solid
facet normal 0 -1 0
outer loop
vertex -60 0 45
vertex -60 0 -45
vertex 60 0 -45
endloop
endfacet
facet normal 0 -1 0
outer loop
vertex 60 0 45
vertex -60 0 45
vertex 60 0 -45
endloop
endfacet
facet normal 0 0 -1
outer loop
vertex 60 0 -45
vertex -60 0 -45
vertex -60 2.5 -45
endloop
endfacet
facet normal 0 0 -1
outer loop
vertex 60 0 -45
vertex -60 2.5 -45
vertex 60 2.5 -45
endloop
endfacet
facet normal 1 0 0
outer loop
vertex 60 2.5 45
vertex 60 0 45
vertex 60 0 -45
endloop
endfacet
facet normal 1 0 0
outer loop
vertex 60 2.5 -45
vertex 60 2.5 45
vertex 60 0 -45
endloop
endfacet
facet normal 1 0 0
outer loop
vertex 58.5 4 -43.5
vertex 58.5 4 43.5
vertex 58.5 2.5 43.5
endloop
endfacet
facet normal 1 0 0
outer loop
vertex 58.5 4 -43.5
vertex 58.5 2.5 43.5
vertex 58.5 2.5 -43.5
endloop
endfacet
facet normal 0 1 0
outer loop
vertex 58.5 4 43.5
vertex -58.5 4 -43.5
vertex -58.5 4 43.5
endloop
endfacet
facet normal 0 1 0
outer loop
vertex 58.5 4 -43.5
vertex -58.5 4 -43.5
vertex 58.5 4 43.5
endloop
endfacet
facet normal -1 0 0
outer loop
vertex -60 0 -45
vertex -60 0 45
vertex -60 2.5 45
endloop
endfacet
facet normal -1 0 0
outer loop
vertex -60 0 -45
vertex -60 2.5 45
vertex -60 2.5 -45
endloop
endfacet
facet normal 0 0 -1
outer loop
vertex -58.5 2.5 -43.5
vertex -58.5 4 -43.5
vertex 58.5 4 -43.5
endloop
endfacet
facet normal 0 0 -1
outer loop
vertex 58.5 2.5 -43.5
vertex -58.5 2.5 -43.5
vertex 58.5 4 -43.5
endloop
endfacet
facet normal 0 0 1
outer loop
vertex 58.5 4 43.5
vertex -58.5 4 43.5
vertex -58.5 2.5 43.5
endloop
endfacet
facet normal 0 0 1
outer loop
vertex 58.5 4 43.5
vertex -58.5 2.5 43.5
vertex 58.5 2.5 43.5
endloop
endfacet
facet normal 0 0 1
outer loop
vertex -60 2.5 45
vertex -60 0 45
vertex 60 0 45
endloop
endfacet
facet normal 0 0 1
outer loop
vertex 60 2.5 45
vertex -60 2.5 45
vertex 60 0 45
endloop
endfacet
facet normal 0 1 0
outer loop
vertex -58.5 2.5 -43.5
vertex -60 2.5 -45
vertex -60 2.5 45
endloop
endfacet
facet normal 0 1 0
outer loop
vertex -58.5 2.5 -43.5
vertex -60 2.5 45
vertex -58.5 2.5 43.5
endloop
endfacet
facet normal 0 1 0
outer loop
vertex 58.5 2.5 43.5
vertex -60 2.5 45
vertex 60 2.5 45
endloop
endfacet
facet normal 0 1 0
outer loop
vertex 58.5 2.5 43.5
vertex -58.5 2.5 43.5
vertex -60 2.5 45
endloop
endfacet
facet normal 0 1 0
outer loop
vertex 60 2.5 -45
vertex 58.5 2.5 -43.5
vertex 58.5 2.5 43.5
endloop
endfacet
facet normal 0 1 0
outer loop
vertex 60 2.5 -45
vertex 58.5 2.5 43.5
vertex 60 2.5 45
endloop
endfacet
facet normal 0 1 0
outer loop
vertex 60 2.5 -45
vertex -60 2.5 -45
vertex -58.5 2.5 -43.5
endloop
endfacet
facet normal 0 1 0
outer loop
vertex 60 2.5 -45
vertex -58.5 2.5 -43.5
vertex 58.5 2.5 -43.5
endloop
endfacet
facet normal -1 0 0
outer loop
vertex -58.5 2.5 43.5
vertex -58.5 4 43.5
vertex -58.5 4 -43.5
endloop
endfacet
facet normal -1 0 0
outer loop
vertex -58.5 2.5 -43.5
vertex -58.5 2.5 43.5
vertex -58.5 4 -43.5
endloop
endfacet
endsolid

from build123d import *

# Parameters (mm, degrees)
SKETCH1_W           = 120
SKETCH1_H           = 90
BOSS_EXTRUDE1_DEPTH = 4
SKETCH2_OUTSIDE_W   = 152.01
SKETCH2_OUTSIDE_H   = 122.01
SKETCH2_OUTSIDE_W_2 = 117
SKETCH2_OUTSIDE_H_2 = 87
CUT_EXTRUDE1_DEPTH  = 1.5


with BuildPart() as part:
    # Sketch1 → Boss-Extrude1 (new body)
    with BuildSketch(Plane(origin=(0, 0, 0), x_dir=(1, 0, 0), z_dir=(0, 1, 0))):
        Rectangle(SKETCH1_W, SKETCH1_H)
    extrude(amount=BOSS_EXTRUDE1_DEPTH)

    # Sketch2 outside → Cut-Extrude1 (cut)
    with BuildSketch(Plane(origin=(0, 4, 0), x_dir=(1, 0, 0), z_dir=(0, 1, 0))):
        Rectangle(SKETCH2_OUTSIDE_W, SKETCH2_OUTSIDE_H)
        Rectangle(SKETCH2_OUTSIDE_W_2, SKETCH2_OUTSIDE_H_2, mode=Mode.SUBTRACT)
    extrude(amount=-CUT_EXTRUDE1_DEPTH, mode=Mode.SUBTRACT)


solid = part.part
